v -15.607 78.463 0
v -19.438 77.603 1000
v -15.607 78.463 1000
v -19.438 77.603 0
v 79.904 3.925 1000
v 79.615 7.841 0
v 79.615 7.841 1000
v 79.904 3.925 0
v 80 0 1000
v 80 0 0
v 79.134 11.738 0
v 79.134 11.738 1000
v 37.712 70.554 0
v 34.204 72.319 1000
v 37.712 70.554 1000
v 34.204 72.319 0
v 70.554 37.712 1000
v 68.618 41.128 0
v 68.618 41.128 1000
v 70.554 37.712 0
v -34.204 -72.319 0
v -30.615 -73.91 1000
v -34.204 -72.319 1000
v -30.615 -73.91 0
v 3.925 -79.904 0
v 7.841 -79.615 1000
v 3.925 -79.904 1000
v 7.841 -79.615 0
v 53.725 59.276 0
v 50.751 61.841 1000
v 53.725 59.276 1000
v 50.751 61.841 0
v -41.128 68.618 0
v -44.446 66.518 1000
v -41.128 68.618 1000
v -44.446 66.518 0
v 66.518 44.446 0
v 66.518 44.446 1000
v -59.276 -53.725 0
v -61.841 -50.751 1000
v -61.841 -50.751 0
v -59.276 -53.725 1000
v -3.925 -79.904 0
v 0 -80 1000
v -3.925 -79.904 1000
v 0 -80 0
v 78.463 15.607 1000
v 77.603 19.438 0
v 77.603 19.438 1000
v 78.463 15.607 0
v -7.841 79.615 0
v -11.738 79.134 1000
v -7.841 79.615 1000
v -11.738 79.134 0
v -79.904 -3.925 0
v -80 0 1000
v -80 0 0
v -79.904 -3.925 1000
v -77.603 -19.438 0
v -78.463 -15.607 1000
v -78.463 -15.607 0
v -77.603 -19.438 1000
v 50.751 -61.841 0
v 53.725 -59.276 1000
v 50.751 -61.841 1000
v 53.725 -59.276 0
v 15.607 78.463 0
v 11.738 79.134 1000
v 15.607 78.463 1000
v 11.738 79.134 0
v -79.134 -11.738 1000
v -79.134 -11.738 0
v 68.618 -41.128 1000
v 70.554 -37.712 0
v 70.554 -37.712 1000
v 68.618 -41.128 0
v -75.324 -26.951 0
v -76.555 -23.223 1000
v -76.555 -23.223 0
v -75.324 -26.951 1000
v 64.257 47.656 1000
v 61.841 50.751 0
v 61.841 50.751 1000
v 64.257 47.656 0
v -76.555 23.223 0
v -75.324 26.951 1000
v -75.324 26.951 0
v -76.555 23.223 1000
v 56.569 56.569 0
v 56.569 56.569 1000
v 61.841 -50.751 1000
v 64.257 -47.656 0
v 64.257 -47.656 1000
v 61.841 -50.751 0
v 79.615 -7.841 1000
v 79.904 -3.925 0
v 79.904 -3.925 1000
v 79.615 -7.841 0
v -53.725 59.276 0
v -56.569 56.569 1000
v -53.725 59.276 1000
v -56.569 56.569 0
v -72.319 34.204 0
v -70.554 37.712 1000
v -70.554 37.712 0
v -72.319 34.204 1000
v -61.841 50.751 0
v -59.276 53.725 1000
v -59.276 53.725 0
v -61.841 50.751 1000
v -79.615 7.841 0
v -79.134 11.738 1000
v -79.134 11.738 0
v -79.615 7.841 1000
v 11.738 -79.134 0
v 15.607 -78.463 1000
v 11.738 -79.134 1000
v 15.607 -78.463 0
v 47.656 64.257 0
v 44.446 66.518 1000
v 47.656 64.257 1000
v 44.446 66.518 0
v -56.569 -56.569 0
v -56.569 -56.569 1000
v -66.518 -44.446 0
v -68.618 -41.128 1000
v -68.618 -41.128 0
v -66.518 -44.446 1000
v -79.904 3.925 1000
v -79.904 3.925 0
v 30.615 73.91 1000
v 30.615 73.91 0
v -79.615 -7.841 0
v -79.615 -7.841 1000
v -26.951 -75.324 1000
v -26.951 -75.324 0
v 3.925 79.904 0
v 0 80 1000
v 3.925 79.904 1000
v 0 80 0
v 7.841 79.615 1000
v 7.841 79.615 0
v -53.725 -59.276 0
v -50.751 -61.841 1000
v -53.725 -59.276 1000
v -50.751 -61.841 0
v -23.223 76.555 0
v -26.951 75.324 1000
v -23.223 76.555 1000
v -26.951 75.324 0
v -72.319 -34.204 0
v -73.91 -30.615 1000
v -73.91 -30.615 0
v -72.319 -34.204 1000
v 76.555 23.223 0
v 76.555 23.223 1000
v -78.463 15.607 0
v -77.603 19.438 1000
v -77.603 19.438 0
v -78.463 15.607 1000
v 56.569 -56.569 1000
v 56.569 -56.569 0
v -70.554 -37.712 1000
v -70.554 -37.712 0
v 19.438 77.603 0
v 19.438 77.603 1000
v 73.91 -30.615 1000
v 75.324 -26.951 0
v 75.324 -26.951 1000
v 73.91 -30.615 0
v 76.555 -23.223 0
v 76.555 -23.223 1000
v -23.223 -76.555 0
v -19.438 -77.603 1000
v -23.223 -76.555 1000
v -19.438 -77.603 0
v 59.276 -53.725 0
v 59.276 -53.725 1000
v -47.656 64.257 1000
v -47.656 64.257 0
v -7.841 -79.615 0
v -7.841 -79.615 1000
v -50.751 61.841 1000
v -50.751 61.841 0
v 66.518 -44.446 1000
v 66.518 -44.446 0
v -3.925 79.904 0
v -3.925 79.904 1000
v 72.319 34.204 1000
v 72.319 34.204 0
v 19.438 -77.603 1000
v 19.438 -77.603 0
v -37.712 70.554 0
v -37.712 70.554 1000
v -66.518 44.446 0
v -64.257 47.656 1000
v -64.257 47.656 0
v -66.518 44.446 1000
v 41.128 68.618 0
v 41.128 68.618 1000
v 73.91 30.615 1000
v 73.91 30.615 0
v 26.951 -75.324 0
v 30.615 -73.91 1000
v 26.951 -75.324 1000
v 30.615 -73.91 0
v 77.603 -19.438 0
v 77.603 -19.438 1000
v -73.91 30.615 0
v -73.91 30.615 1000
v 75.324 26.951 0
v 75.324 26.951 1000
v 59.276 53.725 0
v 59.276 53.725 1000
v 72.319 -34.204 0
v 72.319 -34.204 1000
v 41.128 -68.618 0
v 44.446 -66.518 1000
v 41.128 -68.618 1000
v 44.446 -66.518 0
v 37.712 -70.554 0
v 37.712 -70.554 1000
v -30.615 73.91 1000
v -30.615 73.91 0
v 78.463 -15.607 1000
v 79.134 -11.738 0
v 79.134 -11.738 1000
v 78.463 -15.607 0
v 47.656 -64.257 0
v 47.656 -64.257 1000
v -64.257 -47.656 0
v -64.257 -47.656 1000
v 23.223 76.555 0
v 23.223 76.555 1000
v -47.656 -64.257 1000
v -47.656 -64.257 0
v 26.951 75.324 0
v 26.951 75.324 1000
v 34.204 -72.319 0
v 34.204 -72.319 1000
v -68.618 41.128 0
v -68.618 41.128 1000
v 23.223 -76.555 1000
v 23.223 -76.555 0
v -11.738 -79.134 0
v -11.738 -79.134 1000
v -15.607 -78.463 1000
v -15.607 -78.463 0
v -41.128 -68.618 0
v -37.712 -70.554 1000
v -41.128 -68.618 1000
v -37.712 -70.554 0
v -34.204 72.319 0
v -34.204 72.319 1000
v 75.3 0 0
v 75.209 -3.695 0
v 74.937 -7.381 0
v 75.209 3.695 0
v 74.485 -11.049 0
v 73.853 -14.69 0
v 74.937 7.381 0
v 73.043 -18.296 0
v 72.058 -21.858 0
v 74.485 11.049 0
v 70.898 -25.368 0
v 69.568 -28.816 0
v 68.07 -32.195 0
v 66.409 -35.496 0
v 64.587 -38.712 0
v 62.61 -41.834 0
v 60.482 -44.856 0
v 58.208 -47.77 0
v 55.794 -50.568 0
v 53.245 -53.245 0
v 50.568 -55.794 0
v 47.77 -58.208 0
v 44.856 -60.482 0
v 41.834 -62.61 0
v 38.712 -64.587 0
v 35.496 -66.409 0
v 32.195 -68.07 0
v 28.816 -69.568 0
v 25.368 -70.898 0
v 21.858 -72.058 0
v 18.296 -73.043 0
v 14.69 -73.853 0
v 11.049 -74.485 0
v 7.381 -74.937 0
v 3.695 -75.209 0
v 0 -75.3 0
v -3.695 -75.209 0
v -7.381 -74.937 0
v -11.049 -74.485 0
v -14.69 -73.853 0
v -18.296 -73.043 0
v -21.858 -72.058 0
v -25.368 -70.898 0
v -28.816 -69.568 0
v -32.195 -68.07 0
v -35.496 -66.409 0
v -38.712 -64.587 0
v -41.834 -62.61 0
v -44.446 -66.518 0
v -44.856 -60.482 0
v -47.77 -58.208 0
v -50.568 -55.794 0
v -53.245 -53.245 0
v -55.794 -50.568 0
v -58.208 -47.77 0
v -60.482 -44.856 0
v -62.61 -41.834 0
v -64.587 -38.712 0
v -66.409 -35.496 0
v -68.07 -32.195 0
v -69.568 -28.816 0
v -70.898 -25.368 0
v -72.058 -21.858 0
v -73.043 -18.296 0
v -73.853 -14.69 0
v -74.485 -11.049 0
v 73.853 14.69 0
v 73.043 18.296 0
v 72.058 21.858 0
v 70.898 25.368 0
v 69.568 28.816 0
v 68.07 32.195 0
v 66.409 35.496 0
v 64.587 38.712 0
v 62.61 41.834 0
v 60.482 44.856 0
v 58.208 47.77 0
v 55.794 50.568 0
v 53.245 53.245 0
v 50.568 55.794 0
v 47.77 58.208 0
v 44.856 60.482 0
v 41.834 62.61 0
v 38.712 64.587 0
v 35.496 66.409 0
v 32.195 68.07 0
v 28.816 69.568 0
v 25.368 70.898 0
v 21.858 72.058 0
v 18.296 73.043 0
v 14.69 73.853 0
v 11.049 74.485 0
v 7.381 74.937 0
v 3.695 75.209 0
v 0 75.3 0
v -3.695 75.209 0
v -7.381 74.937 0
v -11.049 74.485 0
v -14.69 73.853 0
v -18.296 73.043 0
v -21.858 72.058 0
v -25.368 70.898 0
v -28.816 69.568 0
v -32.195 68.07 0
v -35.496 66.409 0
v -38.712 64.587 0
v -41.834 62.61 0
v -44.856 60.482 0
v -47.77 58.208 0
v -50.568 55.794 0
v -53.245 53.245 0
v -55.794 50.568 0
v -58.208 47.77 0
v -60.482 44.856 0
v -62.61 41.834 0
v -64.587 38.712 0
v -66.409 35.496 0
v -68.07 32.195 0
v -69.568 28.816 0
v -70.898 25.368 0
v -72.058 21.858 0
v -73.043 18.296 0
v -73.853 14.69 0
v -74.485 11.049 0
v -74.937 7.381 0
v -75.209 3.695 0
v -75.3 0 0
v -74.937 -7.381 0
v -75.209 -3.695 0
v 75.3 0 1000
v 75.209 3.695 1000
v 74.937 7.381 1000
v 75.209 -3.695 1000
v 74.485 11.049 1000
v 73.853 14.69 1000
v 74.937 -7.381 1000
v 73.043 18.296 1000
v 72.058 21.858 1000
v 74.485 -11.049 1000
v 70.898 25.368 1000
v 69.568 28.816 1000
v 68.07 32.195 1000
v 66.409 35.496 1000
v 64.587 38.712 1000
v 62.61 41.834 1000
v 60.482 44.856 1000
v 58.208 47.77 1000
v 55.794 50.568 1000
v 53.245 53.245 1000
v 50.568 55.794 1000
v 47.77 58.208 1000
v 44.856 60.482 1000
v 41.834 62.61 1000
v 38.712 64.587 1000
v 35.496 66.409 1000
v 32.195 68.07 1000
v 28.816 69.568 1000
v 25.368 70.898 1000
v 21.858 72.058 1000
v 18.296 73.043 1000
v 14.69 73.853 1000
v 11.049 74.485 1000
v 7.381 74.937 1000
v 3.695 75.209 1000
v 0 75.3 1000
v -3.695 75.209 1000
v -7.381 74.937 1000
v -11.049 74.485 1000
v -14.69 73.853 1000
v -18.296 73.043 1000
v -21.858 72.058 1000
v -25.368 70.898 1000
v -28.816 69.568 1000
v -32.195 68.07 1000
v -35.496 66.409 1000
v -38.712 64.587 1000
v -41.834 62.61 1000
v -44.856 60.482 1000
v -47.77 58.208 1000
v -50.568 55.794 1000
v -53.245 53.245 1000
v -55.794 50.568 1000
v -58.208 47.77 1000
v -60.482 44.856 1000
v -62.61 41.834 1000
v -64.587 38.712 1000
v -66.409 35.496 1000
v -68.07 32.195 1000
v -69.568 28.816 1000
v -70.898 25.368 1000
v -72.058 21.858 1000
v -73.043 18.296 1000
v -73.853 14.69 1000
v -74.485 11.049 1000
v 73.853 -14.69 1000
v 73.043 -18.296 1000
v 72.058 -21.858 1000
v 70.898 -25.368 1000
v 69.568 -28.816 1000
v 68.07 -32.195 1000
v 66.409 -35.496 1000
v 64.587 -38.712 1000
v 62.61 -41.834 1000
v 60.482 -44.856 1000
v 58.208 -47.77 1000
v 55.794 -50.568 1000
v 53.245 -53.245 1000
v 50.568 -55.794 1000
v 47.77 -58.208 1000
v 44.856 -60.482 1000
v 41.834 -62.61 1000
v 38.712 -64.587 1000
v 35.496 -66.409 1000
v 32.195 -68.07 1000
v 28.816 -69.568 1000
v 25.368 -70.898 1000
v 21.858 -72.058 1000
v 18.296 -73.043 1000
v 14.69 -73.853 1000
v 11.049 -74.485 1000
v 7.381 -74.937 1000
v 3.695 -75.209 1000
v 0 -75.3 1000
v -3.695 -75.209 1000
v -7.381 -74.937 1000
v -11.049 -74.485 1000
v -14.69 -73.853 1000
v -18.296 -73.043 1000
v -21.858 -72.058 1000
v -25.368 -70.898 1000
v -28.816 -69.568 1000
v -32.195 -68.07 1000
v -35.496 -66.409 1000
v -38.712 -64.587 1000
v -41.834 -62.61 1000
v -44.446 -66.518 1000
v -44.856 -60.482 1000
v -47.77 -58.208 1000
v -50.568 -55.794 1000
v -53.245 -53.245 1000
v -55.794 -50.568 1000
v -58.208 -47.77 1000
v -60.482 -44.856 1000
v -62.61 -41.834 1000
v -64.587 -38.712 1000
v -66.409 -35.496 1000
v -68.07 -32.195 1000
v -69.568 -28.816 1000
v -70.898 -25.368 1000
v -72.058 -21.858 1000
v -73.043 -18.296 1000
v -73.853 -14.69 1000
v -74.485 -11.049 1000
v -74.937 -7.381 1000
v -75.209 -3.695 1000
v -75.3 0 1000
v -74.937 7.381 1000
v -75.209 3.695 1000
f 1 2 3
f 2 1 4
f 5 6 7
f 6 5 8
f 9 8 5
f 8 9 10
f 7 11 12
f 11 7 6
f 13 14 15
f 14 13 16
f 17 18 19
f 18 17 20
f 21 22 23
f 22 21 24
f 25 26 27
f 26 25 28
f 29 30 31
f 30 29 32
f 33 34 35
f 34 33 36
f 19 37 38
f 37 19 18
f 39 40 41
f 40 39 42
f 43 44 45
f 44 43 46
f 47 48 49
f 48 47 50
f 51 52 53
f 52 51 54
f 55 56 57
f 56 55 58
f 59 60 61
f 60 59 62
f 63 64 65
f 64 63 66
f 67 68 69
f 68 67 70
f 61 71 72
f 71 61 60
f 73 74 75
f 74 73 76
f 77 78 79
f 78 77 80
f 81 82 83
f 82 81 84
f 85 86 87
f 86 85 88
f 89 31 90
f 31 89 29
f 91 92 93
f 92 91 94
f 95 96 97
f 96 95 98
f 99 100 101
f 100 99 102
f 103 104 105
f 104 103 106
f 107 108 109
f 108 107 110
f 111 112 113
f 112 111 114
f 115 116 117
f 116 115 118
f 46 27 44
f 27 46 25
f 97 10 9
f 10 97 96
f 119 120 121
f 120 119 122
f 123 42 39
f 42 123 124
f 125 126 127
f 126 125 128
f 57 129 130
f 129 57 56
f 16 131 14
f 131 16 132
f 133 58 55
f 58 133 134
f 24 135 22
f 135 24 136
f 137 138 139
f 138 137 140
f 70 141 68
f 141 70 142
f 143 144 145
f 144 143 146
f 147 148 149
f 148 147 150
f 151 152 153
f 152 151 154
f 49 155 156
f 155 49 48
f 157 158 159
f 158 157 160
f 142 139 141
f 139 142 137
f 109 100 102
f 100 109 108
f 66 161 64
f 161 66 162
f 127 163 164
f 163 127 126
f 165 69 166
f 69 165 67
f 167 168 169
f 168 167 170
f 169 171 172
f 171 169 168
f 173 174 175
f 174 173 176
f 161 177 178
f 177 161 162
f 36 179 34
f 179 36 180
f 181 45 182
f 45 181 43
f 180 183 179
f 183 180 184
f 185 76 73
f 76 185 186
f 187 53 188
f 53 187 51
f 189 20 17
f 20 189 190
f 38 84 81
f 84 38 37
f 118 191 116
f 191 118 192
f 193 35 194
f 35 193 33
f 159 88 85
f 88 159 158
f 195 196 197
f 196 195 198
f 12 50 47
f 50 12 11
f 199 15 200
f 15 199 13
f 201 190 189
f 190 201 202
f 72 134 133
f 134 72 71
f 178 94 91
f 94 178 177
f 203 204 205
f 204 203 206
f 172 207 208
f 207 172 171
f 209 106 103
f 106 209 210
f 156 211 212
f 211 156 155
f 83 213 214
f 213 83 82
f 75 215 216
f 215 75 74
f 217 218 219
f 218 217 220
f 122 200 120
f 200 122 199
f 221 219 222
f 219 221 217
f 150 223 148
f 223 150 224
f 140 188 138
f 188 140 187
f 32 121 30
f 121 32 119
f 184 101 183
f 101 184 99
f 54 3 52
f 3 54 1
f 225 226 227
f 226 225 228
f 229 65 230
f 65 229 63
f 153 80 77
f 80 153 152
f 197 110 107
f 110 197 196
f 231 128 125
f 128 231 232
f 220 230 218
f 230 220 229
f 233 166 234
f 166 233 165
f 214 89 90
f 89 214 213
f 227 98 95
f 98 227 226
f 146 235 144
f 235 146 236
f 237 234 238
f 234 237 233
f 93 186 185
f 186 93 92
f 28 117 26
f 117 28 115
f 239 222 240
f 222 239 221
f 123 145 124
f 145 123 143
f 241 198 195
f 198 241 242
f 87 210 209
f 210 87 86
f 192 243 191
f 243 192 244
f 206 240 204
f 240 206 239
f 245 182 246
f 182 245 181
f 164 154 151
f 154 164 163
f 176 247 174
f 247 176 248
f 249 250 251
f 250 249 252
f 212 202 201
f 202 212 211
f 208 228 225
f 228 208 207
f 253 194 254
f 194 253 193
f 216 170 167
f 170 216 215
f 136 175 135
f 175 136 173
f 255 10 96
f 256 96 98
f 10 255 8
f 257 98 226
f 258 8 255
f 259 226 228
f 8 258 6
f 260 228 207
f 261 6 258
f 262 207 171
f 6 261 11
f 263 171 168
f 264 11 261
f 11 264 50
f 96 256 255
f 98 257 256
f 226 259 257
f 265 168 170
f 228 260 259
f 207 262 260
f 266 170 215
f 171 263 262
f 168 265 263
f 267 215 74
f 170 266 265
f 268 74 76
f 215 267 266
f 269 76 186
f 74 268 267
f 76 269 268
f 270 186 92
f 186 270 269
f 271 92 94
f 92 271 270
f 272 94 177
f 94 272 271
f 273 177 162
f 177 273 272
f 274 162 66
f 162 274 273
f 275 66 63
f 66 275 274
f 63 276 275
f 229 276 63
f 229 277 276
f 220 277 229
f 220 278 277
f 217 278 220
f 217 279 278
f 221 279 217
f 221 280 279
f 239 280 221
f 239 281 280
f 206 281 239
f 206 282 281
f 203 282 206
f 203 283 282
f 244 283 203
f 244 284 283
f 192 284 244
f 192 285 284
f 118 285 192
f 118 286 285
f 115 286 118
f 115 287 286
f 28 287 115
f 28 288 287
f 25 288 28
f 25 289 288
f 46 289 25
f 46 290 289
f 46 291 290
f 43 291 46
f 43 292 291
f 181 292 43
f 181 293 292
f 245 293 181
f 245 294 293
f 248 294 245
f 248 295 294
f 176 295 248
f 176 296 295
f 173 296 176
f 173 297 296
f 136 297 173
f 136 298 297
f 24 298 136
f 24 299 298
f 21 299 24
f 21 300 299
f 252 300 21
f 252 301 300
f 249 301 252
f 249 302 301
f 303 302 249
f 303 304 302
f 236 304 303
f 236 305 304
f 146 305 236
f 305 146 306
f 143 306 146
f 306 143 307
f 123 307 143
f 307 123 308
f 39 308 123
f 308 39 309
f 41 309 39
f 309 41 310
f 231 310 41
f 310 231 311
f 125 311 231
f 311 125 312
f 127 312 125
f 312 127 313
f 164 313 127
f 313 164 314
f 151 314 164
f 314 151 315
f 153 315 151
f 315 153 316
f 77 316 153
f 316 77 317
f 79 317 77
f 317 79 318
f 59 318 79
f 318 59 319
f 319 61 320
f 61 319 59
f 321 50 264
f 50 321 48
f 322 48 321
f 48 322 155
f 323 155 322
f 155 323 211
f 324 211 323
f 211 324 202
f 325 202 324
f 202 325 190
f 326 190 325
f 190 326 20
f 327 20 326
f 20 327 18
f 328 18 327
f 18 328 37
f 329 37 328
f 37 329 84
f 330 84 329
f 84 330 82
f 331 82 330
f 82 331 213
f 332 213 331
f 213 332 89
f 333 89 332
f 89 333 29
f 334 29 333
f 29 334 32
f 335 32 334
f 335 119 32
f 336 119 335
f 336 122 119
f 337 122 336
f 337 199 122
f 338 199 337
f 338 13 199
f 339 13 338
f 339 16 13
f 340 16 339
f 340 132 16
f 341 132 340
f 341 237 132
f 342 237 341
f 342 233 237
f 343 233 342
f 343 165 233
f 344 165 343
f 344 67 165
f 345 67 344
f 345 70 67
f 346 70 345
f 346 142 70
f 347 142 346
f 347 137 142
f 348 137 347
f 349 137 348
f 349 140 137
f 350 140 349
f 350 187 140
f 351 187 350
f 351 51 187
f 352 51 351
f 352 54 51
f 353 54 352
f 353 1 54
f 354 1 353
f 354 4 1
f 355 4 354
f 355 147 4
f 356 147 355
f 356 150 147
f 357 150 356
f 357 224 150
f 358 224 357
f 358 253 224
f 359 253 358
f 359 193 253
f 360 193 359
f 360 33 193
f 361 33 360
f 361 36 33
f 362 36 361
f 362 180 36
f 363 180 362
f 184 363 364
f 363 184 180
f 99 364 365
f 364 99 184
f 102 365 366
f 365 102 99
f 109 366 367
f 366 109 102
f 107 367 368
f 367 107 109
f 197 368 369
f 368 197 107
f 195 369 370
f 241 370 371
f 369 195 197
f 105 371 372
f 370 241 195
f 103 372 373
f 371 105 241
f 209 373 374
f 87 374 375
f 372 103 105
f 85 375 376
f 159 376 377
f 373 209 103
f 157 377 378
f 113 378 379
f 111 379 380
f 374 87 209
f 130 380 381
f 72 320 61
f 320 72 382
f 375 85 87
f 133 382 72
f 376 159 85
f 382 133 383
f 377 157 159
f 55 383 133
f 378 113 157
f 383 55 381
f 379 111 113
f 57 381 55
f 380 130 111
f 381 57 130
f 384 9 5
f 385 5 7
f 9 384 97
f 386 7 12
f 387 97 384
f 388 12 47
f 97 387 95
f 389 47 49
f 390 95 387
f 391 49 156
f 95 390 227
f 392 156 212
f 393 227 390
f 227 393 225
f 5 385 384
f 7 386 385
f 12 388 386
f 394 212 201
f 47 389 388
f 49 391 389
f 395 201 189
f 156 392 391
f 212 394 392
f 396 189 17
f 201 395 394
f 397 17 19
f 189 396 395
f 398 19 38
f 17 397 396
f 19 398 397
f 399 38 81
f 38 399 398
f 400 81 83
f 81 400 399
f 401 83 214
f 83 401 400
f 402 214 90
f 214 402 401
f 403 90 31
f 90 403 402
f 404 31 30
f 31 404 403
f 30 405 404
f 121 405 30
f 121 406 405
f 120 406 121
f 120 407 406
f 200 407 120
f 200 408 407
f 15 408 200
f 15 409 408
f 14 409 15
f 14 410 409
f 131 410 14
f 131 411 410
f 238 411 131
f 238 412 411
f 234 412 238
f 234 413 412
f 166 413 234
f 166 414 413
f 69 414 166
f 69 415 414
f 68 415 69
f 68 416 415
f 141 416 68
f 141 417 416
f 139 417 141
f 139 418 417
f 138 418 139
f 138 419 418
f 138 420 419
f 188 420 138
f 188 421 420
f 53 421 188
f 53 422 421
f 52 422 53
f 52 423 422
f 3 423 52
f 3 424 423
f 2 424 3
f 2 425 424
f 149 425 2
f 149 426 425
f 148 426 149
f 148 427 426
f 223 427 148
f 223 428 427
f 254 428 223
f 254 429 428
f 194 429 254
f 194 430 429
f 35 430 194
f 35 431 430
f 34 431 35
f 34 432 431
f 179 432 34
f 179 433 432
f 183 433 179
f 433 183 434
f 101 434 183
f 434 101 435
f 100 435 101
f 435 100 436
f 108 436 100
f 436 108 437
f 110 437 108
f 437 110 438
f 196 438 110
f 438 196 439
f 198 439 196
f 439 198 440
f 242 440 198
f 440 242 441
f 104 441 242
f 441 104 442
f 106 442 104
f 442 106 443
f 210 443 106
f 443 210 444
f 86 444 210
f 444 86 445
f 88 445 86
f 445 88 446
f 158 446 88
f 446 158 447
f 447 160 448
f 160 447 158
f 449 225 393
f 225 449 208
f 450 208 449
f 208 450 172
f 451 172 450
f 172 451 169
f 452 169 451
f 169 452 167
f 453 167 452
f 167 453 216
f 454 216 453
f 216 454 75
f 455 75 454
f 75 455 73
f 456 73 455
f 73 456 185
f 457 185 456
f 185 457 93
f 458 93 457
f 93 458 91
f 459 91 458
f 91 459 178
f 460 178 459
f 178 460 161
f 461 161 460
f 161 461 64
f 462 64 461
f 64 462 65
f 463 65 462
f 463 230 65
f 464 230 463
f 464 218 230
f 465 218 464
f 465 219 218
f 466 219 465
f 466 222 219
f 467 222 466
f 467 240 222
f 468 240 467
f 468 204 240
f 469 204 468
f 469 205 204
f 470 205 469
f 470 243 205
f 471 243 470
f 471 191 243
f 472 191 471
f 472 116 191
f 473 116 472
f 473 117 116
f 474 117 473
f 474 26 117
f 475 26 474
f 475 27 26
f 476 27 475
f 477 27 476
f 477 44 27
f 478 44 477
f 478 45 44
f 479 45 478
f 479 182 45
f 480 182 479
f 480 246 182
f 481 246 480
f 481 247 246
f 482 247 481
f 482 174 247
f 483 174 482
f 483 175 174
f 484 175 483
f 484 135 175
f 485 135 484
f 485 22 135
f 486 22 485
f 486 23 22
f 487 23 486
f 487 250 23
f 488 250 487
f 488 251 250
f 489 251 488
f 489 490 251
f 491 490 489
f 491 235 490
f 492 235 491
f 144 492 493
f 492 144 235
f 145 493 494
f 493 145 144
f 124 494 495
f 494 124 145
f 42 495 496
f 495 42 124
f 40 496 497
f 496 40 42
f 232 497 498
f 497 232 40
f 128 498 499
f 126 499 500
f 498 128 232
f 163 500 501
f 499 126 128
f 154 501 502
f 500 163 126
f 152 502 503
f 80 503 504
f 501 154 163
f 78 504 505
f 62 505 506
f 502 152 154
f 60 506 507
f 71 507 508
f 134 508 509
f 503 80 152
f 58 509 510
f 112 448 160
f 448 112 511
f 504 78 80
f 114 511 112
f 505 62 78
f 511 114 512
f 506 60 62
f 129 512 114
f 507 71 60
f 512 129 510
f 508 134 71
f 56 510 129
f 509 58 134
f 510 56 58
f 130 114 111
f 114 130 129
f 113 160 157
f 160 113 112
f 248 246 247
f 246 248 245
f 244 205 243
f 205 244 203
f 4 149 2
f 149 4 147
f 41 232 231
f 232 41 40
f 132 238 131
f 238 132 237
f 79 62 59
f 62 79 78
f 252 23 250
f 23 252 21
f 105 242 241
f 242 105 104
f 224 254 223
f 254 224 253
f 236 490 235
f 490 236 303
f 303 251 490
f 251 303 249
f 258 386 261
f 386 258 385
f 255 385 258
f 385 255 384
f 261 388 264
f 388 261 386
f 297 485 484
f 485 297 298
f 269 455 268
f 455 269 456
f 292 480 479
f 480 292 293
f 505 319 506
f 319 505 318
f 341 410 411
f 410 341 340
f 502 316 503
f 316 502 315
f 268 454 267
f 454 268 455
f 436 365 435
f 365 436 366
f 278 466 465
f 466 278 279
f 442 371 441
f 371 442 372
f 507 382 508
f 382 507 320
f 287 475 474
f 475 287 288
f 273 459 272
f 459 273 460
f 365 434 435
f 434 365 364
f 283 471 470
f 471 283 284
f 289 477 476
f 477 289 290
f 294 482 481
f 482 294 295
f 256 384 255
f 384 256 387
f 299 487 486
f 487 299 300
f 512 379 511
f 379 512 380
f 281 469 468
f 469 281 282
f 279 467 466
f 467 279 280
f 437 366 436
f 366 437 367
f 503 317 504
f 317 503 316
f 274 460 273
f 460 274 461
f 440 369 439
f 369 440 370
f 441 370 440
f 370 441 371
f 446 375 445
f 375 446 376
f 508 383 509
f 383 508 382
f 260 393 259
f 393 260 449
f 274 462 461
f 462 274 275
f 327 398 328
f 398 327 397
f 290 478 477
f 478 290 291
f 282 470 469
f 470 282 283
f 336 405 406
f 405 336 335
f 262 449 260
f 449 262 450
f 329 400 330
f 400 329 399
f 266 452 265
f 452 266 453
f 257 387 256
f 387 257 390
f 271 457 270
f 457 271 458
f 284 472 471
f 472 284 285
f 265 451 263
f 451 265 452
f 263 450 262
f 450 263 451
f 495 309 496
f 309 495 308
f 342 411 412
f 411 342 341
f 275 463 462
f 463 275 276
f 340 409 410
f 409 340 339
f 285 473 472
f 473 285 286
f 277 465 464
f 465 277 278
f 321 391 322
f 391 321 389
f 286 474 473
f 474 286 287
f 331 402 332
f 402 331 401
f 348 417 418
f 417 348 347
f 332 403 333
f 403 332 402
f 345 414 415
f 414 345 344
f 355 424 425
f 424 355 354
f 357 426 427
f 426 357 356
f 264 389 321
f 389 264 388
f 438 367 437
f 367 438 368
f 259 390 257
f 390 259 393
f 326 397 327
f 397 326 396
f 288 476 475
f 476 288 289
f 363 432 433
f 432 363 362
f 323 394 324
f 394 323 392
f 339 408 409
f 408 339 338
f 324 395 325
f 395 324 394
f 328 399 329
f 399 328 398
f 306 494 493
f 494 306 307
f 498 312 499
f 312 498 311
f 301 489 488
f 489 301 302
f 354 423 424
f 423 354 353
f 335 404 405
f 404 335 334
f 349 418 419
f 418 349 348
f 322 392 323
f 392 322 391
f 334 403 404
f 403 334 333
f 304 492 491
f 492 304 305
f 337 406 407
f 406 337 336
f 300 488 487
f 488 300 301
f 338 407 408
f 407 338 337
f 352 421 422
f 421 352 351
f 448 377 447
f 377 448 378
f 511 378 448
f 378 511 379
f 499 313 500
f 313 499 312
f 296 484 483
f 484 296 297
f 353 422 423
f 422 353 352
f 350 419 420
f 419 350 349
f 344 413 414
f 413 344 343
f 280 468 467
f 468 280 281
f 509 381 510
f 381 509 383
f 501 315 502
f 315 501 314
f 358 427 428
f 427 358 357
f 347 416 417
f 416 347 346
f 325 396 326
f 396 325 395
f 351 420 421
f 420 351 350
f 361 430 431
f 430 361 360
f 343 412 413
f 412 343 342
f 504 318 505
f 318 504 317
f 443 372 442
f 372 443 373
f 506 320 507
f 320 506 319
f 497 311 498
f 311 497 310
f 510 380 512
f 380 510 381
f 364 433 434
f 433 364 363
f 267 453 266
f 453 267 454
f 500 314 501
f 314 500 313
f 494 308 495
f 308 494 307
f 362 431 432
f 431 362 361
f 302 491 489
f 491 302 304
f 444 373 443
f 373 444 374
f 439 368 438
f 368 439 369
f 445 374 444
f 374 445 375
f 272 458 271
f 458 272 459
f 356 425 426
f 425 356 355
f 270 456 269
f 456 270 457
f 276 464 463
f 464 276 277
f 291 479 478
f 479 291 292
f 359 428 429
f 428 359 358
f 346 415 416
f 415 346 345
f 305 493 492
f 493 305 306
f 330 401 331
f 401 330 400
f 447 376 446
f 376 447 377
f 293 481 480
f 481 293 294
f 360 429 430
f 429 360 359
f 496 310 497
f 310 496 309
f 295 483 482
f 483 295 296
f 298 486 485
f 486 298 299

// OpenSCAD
$fn=128;

// HT pipe parameters (mm)
outer_d = 160;
length  = 1000;

// Typical HT (indoor sewer) wall thickness approximation for DN160
wall = 4.7;

inner_d = outer_d - 2*wall;

difference() {
  cylinder(h=length, d=outer_d, center=false);
  translate([0,0,-0.5])
    cylinder(h=length+1, d=inner_d, center=false);
}
